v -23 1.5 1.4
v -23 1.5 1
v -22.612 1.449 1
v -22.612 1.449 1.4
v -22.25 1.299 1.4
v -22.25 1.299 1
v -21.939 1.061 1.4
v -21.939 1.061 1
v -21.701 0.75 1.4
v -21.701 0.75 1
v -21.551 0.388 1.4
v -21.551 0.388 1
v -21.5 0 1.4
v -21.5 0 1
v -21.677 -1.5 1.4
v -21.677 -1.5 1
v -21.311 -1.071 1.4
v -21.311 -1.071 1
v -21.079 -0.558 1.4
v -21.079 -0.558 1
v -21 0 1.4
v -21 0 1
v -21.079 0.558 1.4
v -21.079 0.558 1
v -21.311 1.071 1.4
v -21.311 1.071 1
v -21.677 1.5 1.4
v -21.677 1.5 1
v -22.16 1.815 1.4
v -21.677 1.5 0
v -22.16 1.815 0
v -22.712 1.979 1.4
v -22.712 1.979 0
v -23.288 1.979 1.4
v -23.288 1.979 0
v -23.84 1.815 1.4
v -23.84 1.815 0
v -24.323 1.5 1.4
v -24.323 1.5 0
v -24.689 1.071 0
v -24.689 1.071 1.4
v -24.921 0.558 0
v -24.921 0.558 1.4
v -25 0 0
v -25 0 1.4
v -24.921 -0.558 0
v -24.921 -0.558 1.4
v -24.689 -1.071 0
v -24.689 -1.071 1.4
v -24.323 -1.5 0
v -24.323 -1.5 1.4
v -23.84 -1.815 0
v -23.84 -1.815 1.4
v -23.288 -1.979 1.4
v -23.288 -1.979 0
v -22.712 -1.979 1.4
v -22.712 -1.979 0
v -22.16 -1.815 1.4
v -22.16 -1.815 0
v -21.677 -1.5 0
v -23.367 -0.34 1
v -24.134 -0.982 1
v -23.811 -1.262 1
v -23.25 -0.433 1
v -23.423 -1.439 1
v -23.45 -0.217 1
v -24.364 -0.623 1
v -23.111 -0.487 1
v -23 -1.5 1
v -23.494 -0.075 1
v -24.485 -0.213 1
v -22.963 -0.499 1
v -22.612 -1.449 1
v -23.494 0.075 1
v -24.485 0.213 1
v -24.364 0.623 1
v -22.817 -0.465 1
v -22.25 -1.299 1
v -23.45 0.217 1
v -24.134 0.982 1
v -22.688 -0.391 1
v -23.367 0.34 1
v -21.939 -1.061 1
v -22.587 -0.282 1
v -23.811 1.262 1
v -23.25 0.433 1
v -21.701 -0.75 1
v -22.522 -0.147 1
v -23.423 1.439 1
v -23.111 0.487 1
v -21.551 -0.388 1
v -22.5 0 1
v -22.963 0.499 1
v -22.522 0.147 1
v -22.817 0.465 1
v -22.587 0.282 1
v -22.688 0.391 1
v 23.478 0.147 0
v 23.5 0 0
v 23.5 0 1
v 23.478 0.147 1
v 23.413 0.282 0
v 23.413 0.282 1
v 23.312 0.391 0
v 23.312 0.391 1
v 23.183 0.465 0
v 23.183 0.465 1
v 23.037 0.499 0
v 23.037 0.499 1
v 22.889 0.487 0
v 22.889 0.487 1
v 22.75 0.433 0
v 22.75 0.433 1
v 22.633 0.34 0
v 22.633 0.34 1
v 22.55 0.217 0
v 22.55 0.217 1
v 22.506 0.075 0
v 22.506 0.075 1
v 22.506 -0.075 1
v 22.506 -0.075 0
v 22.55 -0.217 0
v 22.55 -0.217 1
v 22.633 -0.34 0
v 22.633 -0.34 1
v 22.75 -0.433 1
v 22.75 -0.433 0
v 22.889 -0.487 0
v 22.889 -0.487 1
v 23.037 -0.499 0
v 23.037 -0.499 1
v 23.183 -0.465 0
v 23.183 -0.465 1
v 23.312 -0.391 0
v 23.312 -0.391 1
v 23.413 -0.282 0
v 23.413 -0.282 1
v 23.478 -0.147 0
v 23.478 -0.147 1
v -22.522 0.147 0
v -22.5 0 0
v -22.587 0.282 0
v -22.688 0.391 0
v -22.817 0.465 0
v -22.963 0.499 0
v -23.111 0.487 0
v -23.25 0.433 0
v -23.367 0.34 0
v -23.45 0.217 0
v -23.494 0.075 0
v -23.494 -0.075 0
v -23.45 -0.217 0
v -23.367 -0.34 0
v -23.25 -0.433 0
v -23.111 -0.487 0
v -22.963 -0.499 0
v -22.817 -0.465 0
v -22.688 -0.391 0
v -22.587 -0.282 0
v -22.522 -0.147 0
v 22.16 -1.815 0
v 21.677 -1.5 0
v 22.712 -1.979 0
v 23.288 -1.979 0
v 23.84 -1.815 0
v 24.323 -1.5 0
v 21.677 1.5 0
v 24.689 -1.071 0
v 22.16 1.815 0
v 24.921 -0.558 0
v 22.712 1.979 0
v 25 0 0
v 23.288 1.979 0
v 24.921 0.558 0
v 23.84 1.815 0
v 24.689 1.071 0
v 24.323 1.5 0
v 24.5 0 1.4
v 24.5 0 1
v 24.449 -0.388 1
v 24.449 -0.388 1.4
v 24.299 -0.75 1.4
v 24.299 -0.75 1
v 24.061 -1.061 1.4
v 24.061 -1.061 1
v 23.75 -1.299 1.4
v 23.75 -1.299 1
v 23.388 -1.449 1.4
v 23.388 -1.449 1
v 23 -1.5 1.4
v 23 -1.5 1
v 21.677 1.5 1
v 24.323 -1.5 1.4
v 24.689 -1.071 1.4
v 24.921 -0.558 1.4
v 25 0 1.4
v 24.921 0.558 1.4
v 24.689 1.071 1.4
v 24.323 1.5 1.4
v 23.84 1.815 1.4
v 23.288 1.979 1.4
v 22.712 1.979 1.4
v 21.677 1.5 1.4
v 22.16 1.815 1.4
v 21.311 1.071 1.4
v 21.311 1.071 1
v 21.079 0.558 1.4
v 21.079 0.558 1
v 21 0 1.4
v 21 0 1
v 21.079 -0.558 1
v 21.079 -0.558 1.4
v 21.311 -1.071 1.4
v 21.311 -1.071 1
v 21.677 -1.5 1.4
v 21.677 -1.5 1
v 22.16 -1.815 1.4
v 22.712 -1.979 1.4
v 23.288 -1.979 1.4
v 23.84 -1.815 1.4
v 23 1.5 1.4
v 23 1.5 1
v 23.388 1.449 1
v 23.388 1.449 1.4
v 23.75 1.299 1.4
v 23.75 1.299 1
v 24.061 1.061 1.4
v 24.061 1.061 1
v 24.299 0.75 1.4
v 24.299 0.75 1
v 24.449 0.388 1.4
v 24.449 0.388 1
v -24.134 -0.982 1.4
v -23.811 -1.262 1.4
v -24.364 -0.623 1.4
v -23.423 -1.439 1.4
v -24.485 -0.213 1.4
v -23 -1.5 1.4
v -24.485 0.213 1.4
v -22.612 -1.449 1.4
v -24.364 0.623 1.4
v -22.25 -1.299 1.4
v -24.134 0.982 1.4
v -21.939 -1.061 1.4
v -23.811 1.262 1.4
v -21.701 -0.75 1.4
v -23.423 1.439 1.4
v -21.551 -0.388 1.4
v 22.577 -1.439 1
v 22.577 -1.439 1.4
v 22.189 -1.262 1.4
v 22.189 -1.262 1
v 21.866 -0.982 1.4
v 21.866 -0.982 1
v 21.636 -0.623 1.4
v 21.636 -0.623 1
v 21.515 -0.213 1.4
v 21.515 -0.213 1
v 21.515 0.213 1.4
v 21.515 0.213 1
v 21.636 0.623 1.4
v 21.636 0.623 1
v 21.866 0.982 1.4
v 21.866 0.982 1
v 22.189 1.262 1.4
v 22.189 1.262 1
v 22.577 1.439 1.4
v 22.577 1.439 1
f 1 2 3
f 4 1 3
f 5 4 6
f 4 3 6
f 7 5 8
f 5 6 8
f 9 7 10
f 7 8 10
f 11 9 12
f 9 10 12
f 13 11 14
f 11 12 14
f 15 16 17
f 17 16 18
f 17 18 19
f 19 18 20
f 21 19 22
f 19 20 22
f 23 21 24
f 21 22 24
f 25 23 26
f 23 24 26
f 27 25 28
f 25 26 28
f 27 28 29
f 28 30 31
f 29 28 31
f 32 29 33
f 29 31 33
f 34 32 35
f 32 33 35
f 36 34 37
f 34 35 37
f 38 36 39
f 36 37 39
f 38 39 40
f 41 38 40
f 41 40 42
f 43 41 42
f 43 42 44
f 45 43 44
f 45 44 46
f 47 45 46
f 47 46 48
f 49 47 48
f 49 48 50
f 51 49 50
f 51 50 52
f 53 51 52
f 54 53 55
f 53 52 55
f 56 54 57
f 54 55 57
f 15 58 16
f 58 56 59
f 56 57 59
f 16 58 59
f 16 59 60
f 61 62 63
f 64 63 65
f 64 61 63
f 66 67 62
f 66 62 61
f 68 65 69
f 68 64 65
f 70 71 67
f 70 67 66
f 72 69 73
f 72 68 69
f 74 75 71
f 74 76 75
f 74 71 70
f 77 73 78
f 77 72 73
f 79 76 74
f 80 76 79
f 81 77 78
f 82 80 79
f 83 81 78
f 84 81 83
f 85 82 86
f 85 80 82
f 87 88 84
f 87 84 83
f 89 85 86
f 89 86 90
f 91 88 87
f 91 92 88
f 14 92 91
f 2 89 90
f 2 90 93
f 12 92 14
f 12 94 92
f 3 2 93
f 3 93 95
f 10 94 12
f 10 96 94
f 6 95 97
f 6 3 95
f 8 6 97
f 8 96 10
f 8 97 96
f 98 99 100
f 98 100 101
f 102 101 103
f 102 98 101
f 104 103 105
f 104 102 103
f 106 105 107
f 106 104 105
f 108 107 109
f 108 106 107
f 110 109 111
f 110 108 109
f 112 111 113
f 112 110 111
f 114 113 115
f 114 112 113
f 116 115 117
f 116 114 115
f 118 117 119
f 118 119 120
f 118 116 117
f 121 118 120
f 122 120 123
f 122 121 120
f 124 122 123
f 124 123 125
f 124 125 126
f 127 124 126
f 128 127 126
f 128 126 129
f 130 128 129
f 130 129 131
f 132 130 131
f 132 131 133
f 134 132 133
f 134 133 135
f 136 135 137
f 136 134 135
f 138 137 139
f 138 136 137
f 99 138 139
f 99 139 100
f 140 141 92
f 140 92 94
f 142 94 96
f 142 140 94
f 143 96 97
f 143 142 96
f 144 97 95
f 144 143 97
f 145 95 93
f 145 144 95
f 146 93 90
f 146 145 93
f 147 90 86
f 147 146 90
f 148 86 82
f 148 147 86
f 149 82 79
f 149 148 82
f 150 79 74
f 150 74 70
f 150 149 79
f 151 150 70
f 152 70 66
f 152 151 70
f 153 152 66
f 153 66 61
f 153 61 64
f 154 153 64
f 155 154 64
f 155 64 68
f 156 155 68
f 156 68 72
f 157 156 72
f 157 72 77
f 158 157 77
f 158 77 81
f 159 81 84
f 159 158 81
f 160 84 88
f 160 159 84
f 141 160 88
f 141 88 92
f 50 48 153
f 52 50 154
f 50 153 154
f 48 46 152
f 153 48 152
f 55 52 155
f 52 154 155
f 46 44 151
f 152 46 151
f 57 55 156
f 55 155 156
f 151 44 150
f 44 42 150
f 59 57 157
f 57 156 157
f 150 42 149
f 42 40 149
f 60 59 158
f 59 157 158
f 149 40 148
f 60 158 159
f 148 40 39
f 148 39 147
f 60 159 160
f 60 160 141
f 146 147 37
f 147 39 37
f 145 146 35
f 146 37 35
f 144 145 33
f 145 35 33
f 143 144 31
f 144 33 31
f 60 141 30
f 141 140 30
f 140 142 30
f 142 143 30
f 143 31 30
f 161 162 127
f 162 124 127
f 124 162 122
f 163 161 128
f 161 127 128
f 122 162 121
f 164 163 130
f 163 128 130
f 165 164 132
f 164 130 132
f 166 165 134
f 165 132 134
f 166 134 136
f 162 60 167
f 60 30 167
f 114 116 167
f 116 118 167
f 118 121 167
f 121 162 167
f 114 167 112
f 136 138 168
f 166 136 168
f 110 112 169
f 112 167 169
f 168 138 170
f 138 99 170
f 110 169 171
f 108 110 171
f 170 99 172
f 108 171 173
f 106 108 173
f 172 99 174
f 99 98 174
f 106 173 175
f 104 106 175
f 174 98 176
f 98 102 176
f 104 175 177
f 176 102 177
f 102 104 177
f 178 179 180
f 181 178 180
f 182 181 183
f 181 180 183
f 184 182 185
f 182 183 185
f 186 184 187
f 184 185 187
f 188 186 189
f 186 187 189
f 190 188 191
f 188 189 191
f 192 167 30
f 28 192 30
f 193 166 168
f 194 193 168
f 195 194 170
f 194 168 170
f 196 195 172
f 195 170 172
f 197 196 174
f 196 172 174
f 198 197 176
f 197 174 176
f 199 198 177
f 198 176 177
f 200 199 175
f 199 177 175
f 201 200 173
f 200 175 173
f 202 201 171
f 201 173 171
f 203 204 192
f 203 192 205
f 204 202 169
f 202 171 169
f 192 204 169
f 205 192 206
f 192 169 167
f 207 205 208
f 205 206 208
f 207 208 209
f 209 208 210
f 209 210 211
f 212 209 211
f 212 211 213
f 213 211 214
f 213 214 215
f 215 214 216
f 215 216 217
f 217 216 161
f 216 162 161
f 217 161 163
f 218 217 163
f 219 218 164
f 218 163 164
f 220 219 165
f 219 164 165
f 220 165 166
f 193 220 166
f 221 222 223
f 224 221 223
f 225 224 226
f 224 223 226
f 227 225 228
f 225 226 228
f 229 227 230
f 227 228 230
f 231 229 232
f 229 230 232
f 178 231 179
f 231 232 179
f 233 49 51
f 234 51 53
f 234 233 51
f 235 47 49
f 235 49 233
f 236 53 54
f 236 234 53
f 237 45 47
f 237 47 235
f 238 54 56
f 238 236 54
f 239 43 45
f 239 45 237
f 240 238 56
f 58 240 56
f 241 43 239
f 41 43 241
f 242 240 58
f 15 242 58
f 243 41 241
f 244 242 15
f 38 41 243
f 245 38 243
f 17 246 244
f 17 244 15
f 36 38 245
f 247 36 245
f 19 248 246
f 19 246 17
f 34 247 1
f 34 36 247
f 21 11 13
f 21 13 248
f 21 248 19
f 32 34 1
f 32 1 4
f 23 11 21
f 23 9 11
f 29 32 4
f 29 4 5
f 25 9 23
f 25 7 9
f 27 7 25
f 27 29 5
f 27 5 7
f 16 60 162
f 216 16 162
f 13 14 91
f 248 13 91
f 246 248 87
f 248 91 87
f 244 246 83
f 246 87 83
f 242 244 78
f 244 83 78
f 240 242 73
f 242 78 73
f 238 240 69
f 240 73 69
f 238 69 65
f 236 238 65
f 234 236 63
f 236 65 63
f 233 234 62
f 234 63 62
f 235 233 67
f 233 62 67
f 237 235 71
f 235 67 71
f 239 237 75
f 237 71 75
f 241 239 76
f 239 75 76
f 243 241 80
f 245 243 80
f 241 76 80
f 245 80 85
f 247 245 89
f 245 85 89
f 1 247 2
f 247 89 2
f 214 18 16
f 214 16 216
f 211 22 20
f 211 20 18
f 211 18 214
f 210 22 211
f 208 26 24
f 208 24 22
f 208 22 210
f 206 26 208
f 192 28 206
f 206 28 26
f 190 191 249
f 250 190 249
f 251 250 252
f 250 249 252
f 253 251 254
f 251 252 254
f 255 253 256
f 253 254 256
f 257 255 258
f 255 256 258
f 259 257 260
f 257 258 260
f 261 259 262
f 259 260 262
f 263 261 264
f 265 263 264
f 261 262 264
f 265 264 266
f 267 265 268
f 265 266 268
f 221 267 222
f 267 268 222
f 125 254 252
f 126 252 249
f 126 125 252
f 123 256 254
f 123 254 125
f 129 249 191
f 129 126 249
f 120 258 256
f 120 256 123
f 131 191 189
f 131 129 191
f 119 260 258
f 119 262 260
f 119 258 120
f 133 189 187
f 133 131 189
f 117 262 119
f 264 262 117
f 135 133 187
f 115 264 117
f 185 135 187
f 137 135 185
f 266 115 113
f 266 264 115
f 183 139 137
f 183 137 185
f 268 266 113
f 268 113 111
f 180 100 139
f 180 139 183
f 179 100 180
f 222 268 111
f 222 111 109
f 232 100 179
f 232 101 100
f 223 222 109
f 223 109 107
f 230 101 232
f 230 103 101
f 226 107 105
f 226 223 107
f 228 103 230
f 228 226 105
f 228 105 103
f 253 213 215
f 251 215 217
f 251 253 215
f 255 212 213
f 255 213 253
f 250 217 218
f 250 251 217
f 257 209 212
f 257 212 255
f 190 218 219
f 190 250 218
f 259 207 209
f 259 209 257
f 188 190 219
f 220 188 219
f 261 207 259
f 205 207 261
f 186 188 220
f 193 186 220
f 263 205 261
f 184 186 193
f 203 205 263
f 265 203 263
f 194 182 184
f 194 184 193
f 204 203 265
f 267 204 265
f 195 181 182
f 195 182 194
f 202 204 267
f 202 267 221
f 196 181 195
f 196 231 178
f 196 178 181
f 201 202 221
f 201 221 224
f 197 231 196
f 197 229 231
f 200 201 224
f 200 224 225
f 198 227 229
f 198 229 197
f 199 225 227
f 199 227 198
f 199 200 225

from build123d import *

# Parameters (mm, degrees)
F0_R     = 0.5
F1_DEPTH = 1
F2_DEPTH = 1.4


with BuildPart() as f1:
    # F0 (on Top) → F1 (new body)
    with BuildSketch(Plane.XY):
        with BuildLine():
            ThreePointArc((-23, 1.5), (-24.5, 0), (-23, -1.5))
            ThreePointArc((-23, -1.5), (-21.9393398282, -1.0606601718), (-21.5, 0))
            ThreePointArc((-21.5, 0), (-21.9393398282, 1.0606601718), (-23, 1.5))
        make_face()
        with Locations((-23, 0)):
            Circle(F0_R, mode=Mode.SUBTRACT)
        with BuildLine():
            Line((-23, -1.5), (-24.3228756555, -1.5))
            ThreePointArc((-24.3228756555, -1.5), (-23, -2), (-21.6771243445, -1.5))
            Line((-21.6771243445, -1.5), (-23, -1.5))
        make_face()
        with BuildLine():
            ThreePointArc((-21.6771243445, 1.5), (-23, 2), (-24.3228756555, 1.5))
            Line((-24.3228756555, 1.5), (-23, 1.5))
            Line((-23, 1.5), (-21.6771243445, 1.5))
        make_face()
        with BuildLine():
            ThreePointArc((-21, 0), (-21.1771243445, -0.8228756555), (-21.6771243445, -1.5))
            Line((-21.6771243445, -1.5), (21.6771243445, -1.5))
            ThreePointArc((21.6771243445, -1.5), (21, 0), (21.6771243445, 1.5))
            Line((21.6771243445, 1.5), (-21.6771243445, 1.5))
            ThreePointArc((-21.6771243445, 1.5), (-21.1771243445, 0.8228756555), (-21, 0))
        make_face()
        with BuildLine():
            ThreePointArc((23, 1.5), (21.5, 0), (23, -1.5))
            ThreePointArc((23, -1.5), (24.0606601718, -1.0606601718), (24.5, 0))
            ThreePointArc((24.5, 0), (24.0606601718, 1.0606601718), (23, 1.5))
        make_face()
        with Locations((23, 0)):
            Circle(F0_R, mode=Mode.SUBTRACT)
        with BuildLine():
            Line((23, -1.5), (21.6771243445, -1.5))
            ThreePointArc((21.6771243445, -1.5), (23, -2), (24.3228756555, -1.5))
            Line((24.3228756555, -1.5), (23, -1.5))
        make_face()
        with BuildLine():
            ThreePointArc((24.3228756555, 1.5), (23, 2), (21.6771243445, 1.5))
            Line((21.6771243445, 1.5), (23, 1.5))
            Line((23, 1.5), (24.3228756555, 1.5))
        make_face()
        with BuildLine():
            ThreePointArc((21.6771243445, 1.5), (21, 0), (21.6771243445, -1.5))
            Line((21.6771243445, -1.5), (23, -1.5))
            ThreePointArc((23, -1.5), (21.5, 0), (23, 1.5))
            Line((23, 1.5), (21.6771243445, 1.5))
        make_face()
        with BuildLine():
            ThreePointArc((24.5, 0), (24.0606601718, -1.0606601718), (23, -1.5))
            Line((23, -1.5), (24.3228756555, -1.5))
            ThreePointArc((24.3228756555, -1.5), (24.8228756555, -0.8228756555), (25, 0))
            ThreePointArc((25, 0), (24.8228756555, 0.8228756555), (24.3228756555, 1.5))
            Line((24.3228756555, 1.5), (23, 1.5))
            ThreePointArc((23, 1.5), (24.0606601718, 1.0606601718), (24.5, 0))
        make_face()
        with BuildLine():
            ThreePointArc((-25, 0), (-24.8228756555, -0.8228756555), (-24.3228756555, -1.5))
            Line((-24.3228756555, -1.5), (-23, -1.5))
            ThreePointArc((-23, -1.5), (-24.5, 0), (-23, 1.5))
            Line((-23, 1.5), (-24.3228756555, 1.5))
            ThreePointArc((-24.3228756555, 1.5), (-24.8228756555, 0.8228756555), (-25, 0))
        make_face()
        with BuildLine():
            ThreePointArc((-21.5, 0), (-21.9393398282, -1.0606601718), (-23, -1.5))
            Line((-23, -1.5), (-21.6771243445, -1.5))
            ThreePointArc((-21.6771243445, -1.5), (-21.1771243445, -0.8228756555), (-21, 0))
            ThreePointArc((-21, 0), (-21.1771243445, 0.8228756555), (-21.6771243445, 1.5))
            Line((-21.6771243445, 1.5), (-23, 1.5))
            ThreePointArc((-23, 1.5), (-21.9393398282, 1.0606601718), (-21.5, 0))
        make_face()
    extrude(amount=F1_DEPTH)

    # F0 (on Top) → F2 (join)
    with BuildSketch(Plane.XY):
        with BuildLine():
            Line((-23, -1.5), (-24.3228756555, -1.5))
            ThreePointArc((-24.3228756555, -1.5), (-23, -2), (-21.6771243445, -1.5))
            Line((-21.6771243445, -1.5), (-23, -1.5))
        make_face()
        with BuildLine():
            ThreePointArc((-25, 0), (-24.8228756555, -0.8228756555), (-24.3228756555, -1.5))
            Line((-24.3228756555, -1.5), (-23, -1.5))
            ThreePointArc((-23, -1.5), (-24.5, 0), (-23, 1.5))
            Line((-23, 1.5), (-24.3228756555, 1.5))
            ThreePointArc((-24.3228756555, 1.5), (-24.8228756555, 0.8228756555), (-25, 0))
        make_face()
        with BuildLine():
            ThreePointArc((-21.5, 0), (-21.9393398282, -1.0606601718), (-23, -1.5))
            Line((-23, -1.5), (-21.6771243445, -1.5))
            ThreePointArc((-21.6771243445, -1.5), (-21.1771243445, -0.8228756555), (-21, 0))
            ThreePointArc((-21, 0), (-21.1771243445, 0.8228756555), (-21.6771243445, 1.5))
            Line((-21.6771243445, 1.5), (-23, 1.5))
            ThreePointArc((-23, 1.5), (-21.9393398282, 1.0606601718), (-21.5, 0))
        make_face()
        with BuildLine():
            ThreePointArc((-21.6771243445, 1.5), (-23, 2), (-24.3228756555, 1.5))
            Line((-24.3228756555, 1.5), (-23, 1.5))
            Line((-23, 1.5), (-21.6771243445, 1.5))
        make_face()
        with BuildLine():
            Line((23, -1.5), (21.6771243445, -1.5))
            ThreePointArc((21.6771243445, -1.5), (23, -2), (24.3228756555, -1.5))
            Line((24.3228756555, -1.5), (23, -1.5))
        make_face()
        with BuildLine():
            ThreePointArc((24.5, 0), (24.0606601718, -1.0606601718), (23, -1.5))
            Line((23, -1.5), (24.3228756555, -1.5))
            ThreePointArc((24.3228756555, -1.5), (24.8228756555, -0.8228756555), (25, 0))
            ThreePointArc((25, 0), (24.8228756555, 0.8228756555), (24.3228756555, 1.5))
            Line((24.3228756555, 1.5), (23, 1.5))
            ThreePointArc((23, 1.5), (24.0606601718, 1.0606601718), (24.5, 0))
        make_face()
        with BuildLine():
            ThreePointArc((24.3228756555, 1.5), (23, 2), (21.6771243445, 1.5))
            Line((21.6771243445, 1.5), (23, 1.5))
            Line((23, 1.5), (24.3228756555, 1.5))
        make_face()
        with BuildLine():
            ThreePointArc((21.6771243445, 1.5), (21, 0), (21.6771243445, -1.5))
            Line((21.6771243445, -1.5), (23, -1.5))
            ThreePointArc((23, -1.5), (21.5, 0), (23, 1.5))
            Line((23, 1.5), (21.6771243445, 1.5))
        make_face()
    extrude(amount=F2_DEPTH)


solid = f1.part
